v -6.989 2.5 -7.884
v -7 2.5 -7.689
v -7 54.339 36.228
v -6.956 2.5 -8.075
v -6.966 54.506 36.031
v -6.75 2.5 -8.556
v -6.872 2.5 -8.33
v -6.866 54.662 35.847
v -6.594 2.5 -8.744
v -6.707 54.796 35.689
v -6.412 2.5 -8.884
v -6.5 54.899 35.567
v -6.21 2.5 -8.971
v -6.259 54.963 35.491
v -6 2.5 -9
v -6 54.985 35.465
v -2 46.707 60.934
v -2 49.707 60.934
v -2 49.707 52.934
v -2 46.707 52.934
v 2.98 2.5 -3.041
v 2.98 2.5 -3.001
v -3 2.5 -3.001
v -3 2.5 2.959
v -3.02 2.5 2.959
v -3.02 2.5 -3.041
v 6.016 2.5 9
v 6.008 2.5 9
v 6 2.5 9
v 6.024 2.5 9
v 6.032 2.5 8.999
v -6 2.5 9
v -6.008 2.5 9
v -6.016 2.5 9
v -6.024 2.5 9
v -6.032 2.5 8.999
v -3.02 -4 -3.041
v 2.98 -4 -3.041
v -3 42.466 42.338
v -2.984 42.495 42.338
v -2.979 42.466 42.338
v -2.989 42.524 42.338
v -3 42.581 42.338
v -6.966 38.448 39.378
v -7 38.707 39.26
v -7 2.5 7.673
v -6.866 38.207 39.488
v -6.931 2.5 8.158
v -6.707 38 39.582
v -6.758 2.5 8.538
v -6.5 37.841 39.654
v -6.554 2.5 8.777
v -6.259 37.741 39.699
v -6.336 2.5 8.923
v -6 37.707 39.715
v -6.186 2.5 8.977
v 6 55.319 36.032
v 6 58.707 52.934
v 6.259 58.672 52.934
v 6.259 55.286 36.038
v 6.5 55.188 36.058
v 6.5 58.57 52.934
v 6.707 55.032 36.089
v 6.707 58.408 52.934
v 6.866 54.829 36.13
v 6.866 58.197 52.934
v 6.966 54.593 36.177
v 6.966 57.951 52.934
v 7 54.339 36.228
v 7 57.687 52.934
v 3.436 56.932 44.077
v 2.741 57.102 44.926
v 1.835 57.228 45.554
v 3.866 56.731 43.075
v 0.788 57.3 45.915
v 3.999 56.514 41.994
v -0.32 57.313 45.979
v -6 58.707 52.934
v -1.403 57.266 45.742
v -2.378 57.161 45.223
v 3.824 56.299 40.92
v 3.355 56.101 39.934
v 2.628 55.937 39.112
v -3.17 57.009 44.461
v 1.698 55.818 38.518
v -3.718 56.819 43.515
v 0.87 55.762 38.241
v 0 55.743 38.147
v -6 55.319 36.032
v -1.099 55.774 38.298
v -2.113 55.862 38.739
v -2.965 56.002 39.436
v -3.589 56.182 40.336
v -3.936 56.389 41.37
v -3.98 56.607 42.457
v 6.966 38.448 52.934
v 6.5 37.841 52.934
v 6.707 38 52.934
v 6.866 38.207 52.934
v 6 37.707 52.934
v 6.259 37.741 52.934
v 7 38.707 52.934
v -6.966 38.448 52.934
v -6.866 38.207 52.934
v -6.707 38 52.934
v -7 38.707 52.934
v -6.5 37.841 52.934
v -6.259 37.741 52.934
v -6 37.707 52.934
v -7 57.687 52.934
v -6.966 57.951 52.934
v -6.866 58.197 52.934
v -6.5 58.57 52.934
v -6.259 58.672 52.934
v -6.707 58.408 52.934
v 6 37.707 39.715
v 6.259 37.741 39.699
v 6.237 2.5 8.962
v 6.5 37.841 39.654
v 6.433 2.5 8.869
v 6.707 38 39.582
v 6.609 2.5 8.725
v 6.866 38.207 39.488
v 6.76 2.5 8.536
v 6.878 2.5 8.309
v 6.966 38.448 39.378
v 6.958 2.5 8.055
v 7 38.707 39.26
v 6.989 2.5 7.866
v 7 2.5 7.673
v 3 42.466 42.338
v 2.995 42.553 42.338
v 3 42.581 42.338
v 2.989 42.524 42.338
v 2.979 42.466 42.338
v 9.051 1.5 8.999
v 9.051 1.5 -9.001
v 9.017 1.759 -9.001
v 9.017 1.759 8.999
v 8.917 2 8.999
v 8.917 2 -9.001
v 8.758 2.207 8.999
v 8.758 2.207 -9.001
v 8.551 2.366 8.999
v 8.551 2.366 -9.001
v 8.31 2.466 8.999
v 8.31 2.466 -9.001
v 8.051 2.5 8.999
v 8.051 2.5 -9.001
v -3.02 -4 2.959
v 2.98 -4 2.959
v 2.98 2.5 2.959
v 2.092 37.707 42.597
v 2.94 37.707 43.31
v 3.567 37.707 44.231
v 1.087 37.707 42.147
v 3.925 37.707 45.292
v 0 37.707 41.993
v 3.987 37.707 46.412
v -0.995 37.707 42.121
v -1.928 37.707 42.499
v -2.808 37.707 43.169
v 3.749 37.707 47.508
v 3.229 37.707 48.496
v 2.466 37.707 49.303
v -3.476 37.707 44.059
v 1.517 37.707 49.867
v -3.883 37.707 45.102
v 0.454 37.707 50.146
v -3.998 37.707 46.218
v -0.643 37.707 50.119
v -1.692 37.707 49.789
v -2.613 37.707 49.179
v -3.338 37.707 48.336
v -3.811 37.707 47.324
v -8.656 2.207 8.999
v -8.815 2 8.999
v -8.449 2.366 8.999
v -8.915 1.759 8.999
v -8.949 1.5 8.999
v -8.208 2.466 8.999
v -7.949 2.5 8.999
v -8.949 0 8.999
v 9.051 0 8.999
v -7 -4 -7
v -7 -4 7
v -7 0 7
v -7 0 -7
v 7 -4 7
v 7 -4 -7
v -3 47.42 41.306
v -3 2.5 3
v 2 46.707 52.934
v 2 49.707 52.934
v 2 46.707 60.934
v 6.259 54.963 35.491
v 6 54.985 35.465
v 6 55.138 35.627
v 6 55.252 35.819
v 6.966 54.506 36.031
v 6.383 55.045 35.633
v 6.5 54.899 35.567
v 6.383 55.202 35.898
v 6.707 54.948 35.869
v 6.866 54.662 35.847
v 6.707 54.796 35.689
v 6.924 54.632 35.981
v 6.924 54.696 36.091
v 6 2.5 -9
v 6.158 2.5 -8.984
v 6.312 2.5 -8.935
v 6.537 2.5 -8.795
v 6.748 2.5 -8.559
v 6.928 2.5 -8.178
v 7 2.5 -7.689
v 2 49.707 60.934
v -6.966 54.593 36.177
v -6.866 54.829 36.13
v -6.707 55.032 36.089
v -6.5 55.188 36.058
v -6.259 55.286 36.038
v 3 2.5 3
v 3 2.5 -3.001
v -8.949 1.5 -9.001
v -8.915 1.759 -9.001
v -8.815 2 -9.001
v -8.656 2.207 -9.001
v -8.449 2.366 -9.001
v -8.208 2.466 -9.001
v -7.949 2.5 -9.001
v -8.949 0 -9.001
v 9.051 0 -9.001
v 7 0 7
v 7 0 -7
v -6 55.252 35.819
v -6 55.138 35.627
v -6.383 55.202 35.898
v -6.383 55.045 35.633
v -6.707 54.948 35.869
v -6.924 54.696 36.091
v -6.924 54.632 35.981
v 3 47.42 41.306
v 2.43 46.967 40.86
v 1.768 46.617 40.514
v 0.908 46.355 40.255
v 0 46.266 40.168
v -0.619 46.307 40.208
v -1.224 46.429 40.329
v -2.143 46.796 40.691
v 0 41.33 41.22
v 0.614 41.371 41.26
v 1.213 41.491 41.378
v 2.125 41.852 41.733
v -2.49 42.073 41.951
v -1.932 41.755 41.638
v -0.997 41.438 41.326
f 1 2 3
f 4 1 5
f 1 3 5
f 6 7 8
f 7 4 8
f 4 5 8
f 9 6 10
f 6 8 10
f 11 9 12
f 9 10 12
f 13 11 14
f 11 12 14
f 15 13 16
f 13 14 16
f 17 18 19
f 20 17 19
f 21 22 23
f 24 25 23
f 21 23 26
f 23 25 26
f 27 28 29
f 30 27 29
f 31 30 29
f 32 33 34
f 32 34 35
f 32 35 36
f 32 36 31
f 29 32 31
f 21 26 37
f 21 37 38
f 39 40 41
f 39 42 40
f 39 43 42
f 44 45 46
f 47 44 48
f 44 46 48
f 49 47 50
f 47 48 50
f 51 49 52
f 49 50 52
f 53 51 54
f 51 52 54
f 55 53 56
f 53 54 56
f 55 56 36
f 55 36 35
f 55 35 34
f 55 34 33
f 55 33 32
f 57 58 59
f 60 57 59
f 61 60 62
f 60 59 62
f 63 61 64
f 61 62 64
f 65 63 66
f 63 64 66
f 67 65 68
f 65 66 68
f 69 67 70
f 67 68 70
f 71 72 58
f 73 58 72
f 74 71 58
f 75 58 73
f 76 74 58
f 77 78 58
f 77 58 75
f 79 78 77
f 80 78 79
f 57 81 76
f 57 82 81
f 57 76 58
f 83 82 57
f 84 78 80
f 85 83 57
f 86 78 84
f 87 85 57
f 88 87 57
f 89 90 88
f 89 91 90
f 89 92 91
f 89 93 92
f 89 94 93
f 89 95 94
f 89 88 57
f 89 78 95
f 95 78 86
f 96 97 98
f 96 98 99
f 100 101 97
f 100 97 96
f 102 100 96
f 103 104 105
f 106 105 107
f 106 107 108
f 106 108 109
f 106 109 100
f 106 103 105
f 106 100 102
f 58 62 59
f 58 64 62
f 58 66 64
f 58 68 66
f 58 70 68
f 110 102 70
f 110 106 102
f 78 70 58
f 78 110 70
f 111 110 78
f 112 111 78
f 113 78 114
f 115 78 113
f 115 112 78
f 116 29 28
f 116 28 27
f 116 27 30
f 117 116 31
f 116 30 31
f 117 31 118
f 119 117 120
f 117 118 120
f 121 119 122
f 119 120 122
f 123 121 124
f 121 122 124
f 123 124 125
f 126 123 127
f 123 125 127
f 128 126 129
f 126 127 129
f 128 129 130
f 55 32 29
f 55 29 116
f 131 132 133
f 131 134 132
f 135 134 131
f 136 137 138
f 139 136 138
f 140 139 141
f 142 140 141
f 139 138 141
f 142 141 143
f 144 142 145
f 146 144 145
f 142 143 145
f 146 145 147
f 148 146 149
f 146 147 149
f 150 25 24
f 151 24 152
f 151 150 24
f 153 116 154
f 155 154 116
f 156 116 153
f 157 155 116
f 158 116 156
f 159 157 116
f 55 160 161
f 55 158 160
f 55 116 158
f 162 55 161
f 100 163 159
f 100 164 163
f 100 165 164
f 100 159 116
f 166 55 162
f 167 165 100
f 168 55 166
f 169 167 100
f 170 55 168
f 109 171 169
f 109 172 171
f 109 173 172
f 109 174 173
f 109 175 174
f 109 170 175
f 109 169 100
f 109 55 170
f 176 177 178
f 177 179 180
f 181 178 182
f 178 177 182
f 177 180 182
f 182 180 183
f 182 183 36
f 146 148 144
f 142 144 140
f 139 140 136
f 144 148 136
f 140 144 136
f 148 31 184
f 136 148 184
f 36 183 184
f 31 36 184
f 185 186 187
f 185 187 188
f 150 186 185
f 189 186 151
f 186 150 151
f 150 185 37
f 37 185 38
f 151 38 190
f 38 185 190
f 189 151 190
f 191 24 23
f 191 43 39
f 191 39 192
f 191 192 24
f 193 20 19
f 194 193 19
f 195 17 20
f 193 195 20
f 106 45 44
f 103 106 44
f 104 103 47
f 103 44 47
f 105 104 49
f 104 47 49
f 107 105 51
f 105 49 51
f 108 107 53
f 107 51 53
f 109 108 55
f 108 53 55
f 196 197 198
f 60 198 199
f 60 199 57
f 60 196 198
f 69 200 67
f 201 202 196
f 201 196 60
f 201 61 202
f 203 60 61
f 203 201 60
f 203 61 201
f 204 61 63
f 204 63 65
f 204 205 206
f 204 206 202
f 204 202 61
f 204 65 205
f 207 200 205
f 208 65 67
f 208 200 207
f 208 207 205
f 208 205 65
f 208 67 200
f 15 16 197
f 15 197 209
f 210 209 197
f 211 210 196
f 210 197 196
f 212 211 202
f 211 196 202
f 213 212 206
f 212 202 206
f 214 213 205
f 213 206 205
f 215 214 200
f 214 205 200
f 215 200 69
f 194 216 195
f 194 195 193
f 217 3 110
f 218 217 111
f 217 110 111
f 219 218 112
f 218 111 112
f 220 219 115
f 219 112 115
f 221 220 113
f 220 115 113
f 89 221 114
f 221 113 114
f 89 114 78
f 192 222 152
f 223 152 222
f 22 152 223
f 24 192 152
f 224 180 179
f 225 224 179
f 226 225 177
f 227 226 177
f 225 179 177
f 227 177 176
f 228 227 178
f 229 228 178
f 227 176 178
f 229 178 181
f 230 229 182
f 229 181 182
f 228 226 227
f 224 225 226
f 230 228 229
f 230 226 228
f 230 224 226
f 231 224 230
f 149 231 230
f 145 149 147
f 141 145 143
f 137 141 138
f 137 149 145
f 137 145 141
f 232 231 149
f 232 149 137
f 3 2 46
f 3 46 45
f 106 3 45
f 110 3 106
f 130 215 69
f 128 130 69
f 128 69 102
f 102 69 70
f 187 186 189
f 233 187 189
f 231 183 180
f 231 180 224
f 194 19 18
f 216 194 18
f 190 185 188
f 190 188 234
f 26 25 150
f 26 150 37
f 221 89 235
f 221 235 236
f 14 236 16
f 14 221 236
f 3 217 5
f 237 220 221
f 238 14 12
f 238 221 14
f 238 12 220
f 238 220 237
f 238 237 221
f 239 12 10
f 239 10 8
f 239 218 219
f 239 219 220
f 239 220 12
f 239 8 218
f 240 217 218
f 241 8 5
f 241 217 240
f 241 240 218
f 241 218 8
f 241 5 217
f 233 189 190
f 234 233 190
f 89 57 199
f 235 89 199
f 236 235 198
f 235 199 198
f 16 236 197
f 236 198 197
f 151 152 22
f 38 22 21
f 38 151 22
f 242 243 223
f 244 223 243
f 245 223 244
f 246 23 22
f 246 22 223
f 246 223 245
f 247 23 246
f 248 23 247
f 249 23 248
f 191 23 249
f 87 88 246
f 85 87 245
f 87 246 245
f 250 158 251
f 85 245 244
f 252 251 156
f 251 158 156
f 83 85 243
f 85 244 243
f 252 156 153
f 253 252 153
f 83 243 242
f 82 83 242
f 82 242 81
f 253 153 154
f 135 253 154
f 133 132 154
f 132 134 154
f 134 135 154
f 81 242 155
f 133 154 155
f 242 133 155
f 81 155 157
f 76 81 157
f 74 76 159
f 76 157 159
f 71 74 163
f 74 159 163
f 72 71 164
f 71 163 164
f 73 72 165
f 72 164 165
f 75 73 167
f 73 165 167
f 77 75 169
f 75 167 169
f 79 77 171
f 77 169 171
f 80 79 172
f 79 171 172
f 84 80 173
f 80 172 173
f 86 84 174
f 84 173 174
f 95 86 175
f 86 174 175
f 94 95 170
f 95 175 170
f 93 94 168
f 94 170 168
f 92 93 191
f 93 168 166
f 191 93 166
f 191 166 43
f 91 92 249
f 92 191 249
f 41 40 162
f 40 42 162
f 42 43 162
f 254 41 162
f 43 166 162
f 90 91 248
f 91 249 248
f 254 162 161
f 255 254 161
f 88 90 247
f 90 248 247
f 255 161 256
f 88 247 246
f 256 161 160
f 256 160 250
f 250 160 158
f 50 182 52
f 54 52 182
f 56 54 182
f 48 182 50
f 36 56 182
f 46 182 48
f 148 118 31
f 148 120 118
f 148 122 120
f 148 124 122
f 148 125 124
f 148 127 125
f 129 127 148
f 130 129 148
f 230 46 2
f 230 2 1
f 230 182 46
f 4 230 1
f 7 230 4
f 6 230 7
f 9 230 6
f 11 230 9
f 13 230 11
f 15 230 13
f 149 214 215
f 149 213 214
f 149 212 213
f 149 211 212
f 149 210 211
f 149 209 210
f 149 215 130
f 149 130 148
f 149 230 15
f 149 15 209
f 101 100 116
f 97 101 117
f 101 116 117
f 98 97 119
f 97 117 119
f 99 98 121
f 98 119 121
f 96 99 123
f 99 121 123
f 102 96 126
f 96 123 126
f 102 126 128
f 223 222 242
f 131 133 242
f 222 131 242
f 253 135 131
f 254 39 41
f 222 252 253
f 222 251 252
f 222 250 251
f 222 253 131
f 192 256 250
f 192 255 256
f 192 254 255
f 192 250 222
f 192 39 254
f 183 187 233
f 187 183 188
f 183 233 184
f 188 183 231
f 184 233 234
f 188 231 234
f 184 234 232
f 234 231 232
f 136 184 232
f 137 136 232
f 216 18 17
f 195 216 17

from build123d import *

# Parameters (mm, degrees)
BOSS_EXTRUDE1_DEPTH      = 2.5
BOSS_EXTRUDE1_DEPTH_BACK = 4
SKETCH2_W                = 14
SKETCH2_H                = 14
SKETCH11_W               = 18
SKETCH11_H               = 18
BOSS_EXTRUDE4_DEPTH      = 2.5
CUT_EXTRUDE5_DEPTH       = 4
CUT_EXTRUDE5_DEPTH_BACK  = 4
SKETCH3_W                = 6
SKETCH3_H                = 6
BOSS_EXTRUDE5_DEPTH      = 7
BOSS_EXTRUDE5_DEPTH_BACK = 7
CUT_EXTRUDE8_DEPTH       = 3
CUT_EXTRUDE8_DEPTH_BACK  = 3
CUT_SWEEP4_PROFILE_R     = 4
FILLET1_R                = 1
BOSS_EXTRUDE6_DEPTH      = 2
BOSS_EXTRUDE6_DEPTH_BACK = 2


with BuildPart() as part:
    # Sketch2 → Boss-Extrude1 (new, two sides: drawn at the far end of the back side and taken through both)
    with BuildSketch(Plane(origin=(0, 0, 0), x_dir=(1, 0, 0), z_dir=(0, 1, 0)).offset(-BOSS_EXTRUDE1_DEPTH_BACK)):
        Rectangle(SKETCH2_W, SKETCH2_H)
    extrude(amount=BOSS_EXTRUDE1_DEPTH + BOSS_EXTRUDE1_DEPTH_BACK)

    # Sketch11 → Boss-Extrude4 (add)
    with BuildSketch(Plane(origin=(0, 0, 0), x_dir=(1, 0, 0), z_dir=(0, 1, 0))):
        with Locations((0.051179488, 0.000677961)):
            Rectangle(SKETCH11_W, SKETCH11_H)
    extrude(amount=BOSS_EXTRUDE4_DEPTH)

    # Sketch3 → Cut-Extrude5 (cut, two sides: drawn at the far end of the back side and taken through both)
    with BuildSketch(Plane(origin=(0, 0, 0), x_dir=(1, 0, 0), z_dir=(0, 1, 0)).offset(-CUT_EXTRUDE5_DEPTH_BACK)):
        with Locations((-0.020040697, 0.041186537)):
            Rectangle(SKETCH3_W, SKETCH3_H)
    extrude(amount=CUT_EXTRUDE5_DEPTH + CUT_EXTRUDE5_DEPTH_BACK, mode=Mode.SUBTRACT)

    # Sketch13 → Boss-Extrude5 (add, two sides: drawn at the far end of the back side and taken through both)
    with BuildSketch(Plane(origin=(0, 0, 0), x_dir=(0, 0, -1), z_dir=(1, 0, 0)).offset(-BOSS_EXTRUDE5_DEPTH_BACK)):
        Polygon((-39.714937447, 37.706782945), (-52.933941772, 37.706782945), (-52.933941772, 58.706782945), (-35.69014798, 55.251043253), (9, 2.5), (0, 2.5), (-9, 2.5), align=None)
    extrude(amount=BOSS_EXTRUDE5_DEPTH + BOSS_EXTRUDE5_DEPTH_BACK)

    # Sketch16 → Cut-Extrude8 (cut, two sides: drawn at the far end of the back side and taken through both)
    with BuildSketch(Plane(origin=(0, 0, 0), x_dir=(0, 0, -1), z_dir=(1, 0, 0)).offset(-CUT_EXTRUDE8_DEPTH_BACK)):
        Polygon((0.000338981, 2.5), (3.001438968, 2.5), (-42.337880938, 48.465874453), (-42.337880938, 42.465874453), (-2.999661019, 2.5), align=None)
    extrude(amount=CUT_EXTRUDE8_DEPTH + CUT_EXTRUDE8_DEPTH_BACK, mode=Mode.SUBTRACT)

    # Cut-Sweep4: sweep along a path in Sketch52
    with BuildLine(Plane(origin=(0, 0, 0), x_dir=(0, 0, -1), z_dir=(1, 0, 0))) as cut_sweep4_path:
        Line((-41.038463706, 61.362601787), (-48.816572109, 24.884604602))
    # Cut-Sweep4 profile (on start of the path) → Cut-Sweep4 (sweep, cut)
    with BuildSketch(Plane(origin=(0, 61.362601787, 41.038463706), x_dir=(0, -0.20853937389083857, -0.9780139720562366), z_dir=(0, -0.9780139720562366, 0.20853937389083857))):
        Circle(CUT_SWEEP4_PROFILE_R)
    sweep(path=cut_sweep4_path.line, mode=Mode.SUBTRACT)

    # Fillet1
    # the kernel refuses this fillet: 1 mm, written as the material it takes off along each edge
    with BuildSketch(Plane(origin=(6, 54.338960672, 36.228063112), x_dir=(0, 0.6464027717083677, -0.7629963674407237), z_dir=(1, 0, 0))) as fillet1_piece_1_section:
        Polygon((0, 0), (FILLET1_R * 1.02, 0), (FILLET1_R * 1.02, FILLET1_R * 0.355169980491), (FILLET1_R * 0.799402336859, FILLET1_R * 0.633526561262), align=None)
    fillet1_piece_1 = extrude(amount=FILLET1_R * 1.02, mode=Mode.PRIVATE)
    fillet1_piece_1 = fillet1_piece_1 - Plane(origin=(6, 54.338960672, 36.228063112), x_dir=(0, -0.8613575242057089, 0.5079992278480466), z_dir=(1, 0, 0)) * Sphere(FILLET1_R, mode=Mode.PRIVATE)
    add(fillet1_piece_1, mode=Mode.SUBTRACT)
    with BuildSketch(Plane(origin=(-6, 54.338960672, 36.228063112), x_dir=(0, 0.9805042658587001, -0.1964977980357328), z_dir=(-1, 0, 0))) as fillet1_piece_2_section:
        Polygon((0, 0), (FILLET1_R * 1.02, 0), (FILLET1_R * 1.02, FILLET1_R * 0.355169980491), (FILLET1_R * 0.799402336859, FILLET1_R * 0.633526561262), align=None)
    fillet1_piece_2 = extrude(amount=FILLET1_R * 1.02, mode=Mode.PRIVATE)
    fillet1_piece_2 = fillet1_piece_2 - Plane(origin=(-6, 54.338960672, 36.228063112), x_dir=(0, -0.8613575242057089, 0.5079992278480466), z_dir=(-1, 0, 0)) * Sphere(FILLET1_R, mode=Mode.PRIVATE)
    add(fillet1_piece_2, mode=Mode.SUBTRACT)
    with BuildSketch(Plane(origin=(-8.948820512, 2.5, 8.999322039), x_dir=(1, 0, 0), z_dir=(0, 0, -1)), Plane(origin=(9.051179488, 2.5, -9.000677961), x_dir=(-1, 0, 0), z_dir=(0, 0, 1))) as fillet1_piece_3:
        with BuildLine():
            CenterArc((FILLET1_R, FILLET1_R), FILLET1_R, 180, 90)
            Line((0, FILLET1_R), (-FILLET1_R * 0.02, FILLET1_R))
            Line((-FILLET1_R * 0.02, FILLET1_R), (-FILLET1_R * 0.02, -FILLET1_R * 0.02))
            Line((-FILLET1_R * 0.02, -FILLET1_R * 0.02), (FILLET1_R, -FILLET1_R * 0.02))
            Line((FILLET1_R, -FILLET1_R * 0.02), (FILLET1_R, 0))
        make_face()
    extrude(amount=18, mode=Mode.SUBTRACT)
    with BuildSketch(Plane(origin=(7, 0.616147268, 7.356497982), x_dir=(0, 0.6574008072827306, -0.7535410928303872), z_dir=(0, 0.7535410928303872, 0.6574008072827306))) as fillet1_piece_4_section:
        with BuildLine():
            CenterArc((FILLET1_R, FILLET1_R), FILLET1_R, 180, 90)
            Line((0, FILLET1_R), (-FILLET1_R * 0.02, FILLET1_R))
            Line((-FILLET1_R * 0.02, FILLET1_R), (-FILLET1_R * 0.02, -FILLET1_R * 0.02))
            Line((-FILLET1_R * 0.02, -FILLET1_R * 0.02), (FILLET1_R, -FILLET1_R * 0.02))
            Line((FILLET1_R, -FILLET1_R * 0.02), (FILLET1_R, 0))
        make_face()
    fillet1_piece_4 = extrude(amount=51.721782368, mode=Mode.PRIVATE)
    fillet1_piece_4 = split(fillet1_piece_4, bisect_by=Plane(origin=(6.773604886, 2.5, 24.057027094), z_dir=(0, 1, 0)), keep=Keep.TOP, mode=Mode.PRIVATE)
    fillet1_piece_4 = split(fillet1_piece_4, bisect_by=Plane(origin=(6.773604886, 37.706782945, 24.057027094), z_dir=(0, -1, 0)), keep=Keep.TOP, mode=Mode.PRIVATE)
    add(fillet1_piece_4, mode=Mode.SUBTRACT)
    with BuildSketch(Plane(origin=(7, 37.706782945, 37.214937447), x_dir=(0, 1, 0), z_dir=(0, 0, 1))) as fillet1_piece_5_section:
        with BuildLine():
            CenterArc((FILLET1_R, FILLET1_R), FILLET1_R, 180, 90)
            Line((0, FILLET1_R), (-FILLET1_R * 0.02, FILLET1_R))
            Line((-FILLET1_R * 0.02, FILLET1_R), (-FILLET1_R * 0.02, -FILLET1_R * 0.02))
            Line((-FILLET1_R * 0.02, -FILLET1_R * 0.02), (FILLET1_R, -FILLET1_R * 0.02))
            Line((FILLET1_R, -FILLET1_R * 0.02), (FILLET1_R, 0))
        make_face()
    fillet1_piece_5 = extrude(amount=15.719004325, mode=Mode.PRIVATE)
    fillet1_piece_5 = split(fillet1_piece_5, bisect_by=Plane(origin=(6.771765338, 41.156021247, 42.724105847), z_dir=(0, -0.6574008072827306, 0.7535410928303872)), keep=Keep.TOP, mode=Mode.PRIVATE)
    add(fillet1_piece_5, mode=Mode.SUBTRACT)
    with BuildSketch(Plane(origin=(7, 59.19802744, 55.385202437), x_dir=(0, -0.9805042658587001, 0.1964977980357328), z_dir=(0, -0.1964977980357328, -0.9805042658587001))) as fillet1_piece_6_section:
        with BuildLine():
            CenterArc((FILLET1_R, FILLET1_R), FILLET1_R, 180, 90)
            Line((0, FILLET1_R), (-FILLET1_R * 0.02, FILLET1_R))
            Line((-FILLET1_R * 0.02, FILLET1_R), (-FILLET1_R * 0.02, -FILLET1_R * 0.02))
            Line((-FILLET1_R * 0.02, -FILLET1_R * 0.02), (FILLET1_R, -FILLET1_R * 0.02))
            Line((FILLET1_R, -FILLET1_R * 0.02), (FILLET1_R, 0))
        make_face()
    fillet1_piece_6 = extrude(amount=19.738452749, mode=Mode.PRIVATE)
    fillet1_piece_6 = split(fillet1_piece_6, bisect_by=Plane(origin=(6.773284847, 56.78722679, 52.933941772), z_dir=(0, 0, -1)), keep=Keep.TOP, mode=Mode.PRIVATE)
    add(fillet1_piece_6, mode=Mode.SUBTRACT)
    with BuildSketch(Plane(origin=(6, 55.251043253, 35.69014798), x_dir=(0, -0.762996367440723, -0.6464027717083685), z_dir=(-1, 0, 0))) as fillet1_piece_7:
        with BuildLine():
            CenterArc((FILLET1_R * 0.348205863226, FILLET1_R), FILLET1_R, 231.603166209, 38.396833791)
            Line((-FILLET1_R * 0.272898608599, FILLET1_R * 0.216272218766), (-FILLET1_R * 0.285320698036, FILLET1_R * 0.200597663141))
            Line((-FILLET1_R * 0.285320698036, FILLET1_R * 0.200597663141), (-FILLET1_R * 0.00696411726452, -FILLET1_R * 0.02))
            Line((-FILLET1_R * 0.00696411726452, -FILLET1_R * 0.02), (FILLET1_R * 0.348205863226, -FILLET1_R * 0.02))
            Line((FILLET1_R * 0.348205863226, -FILLET1_R * 0.02), (FILLET1_R * 0.348205863226, 0))
        make_face()
    extrude(amount=12, mode=Mode.SUBTRACT)
    with BuildSketch(Plane(origin=(7, 54.985363444, 35.465066745), x_dir=(0, -0.6464027717083677, 0.7629963674407237), z_dir=(0, -0.7629963674407237, -0.6464027717083677))) as fillet1_piece_8_section:
        with BuildLine():
            CenterArc((FILLET1_R, FILLET1_R), FILLET1_R, 180, 90)
            Line((0, FILLET1_R), (-FILLET1_R * 0.02, FILLET1_R))
            Line((-FILLET1_R * 0.02, FILLET1_R), (-FILLET1_R * 0.02, -FILLET1_R * 0.02))
            Line((-FILLET1_R * 0.02, -FILLET1_R * 0.02), (FILLET1_R, -FILLET1_R * 0.02))
            Line((FILLET1_R, -FILLET1_R * 0.02), (FILLET1_R, 0))
        make_face()
    fillet1_piece_8 = extrude(amount=71.28848404, mode=Mode.PRIVATE)
    fillet1_piece_8 = split(fillet1_piece_8, bisect_by=Plane(origin=(6.773265787, 2.5, 13.466666803), z_dir=(0, 1, 0)), keep=Keep.TOP, mode=Mode.PRIVATE)
    add(fillet1_piece_8, mode=Mode.SUBTRACT)
    with BuildSketch(Plane(origin=(-7, 0.616147268, 7.356497982), x_dir=(0, 0.6574008072827306, -0.7535410928303872), z_dir=(0, 0.7535410928303872, 0.6574008072827306))) as fillet1_piece_9_section:
        with BuildLine():
            CenterArc((FILLET1_R, -FILLET1_R), FILLET1_R, 90, 90)
            Line((0, -FILLET1_R), (-FILLET1_R * 0.02, -FILLET1_R))
            Line((-FILLET1_R * 0.02, -FILLET1_R), (-FILLET1_R * 0.02, FILLET1_R * 0.02))
            Line((-FILLET1_R * 0.02, FILLET1_R * 0.02), (FILLET1_R, FILLET1_R * 0.02))
            Line((FILLET1_R, FILLET1_R * 0.02), (FILLET1_R, 0))
        make_face()
    fillet1_piece_9 = extrude(amount=51.721782368, mode=Mode.PRIVATE)
    fillet1_piece_9 = split(fillet1_piece_9, bisect_by=Plane(origin=(-6.773604886, 2.5, 24.057027094), z_dir=(0, 1, 0)), keep=Keep.TOP, mode=Mode.PRIVATE)
    fillet1_piece_9 = split(fillet1_piece_9, bisect_by=Plane(origin=(-6.773604886, 37.706782945, 24.057027094), z_dir=(0, -1, 0)), keep=Keep.TOP, mode=Mode.PRIVATE)
    add(fillet1_piece_9, mode=Mode.SUBTRACT)
    with BuildSketch(Plane(origin=(-7, 37.706782945, 37.214937447), x_dir=(0, 1, 0), z_dir=(0, 0, 1))) as fillet1_piece_10_section:
        with BuildLine():
            CenterArc((FILLET1_R, -FILLET1_R), FILLET1_R, 90, 90)
            Line((0, -FILLET1_R), (-FILLET1_R * 0.02, -FILLET1_R))
            Line((-FILLET1_R * 0.02, -FILLET1_R), (-FILLET1_R * 0.02, FILLET1_R * 0.02))
            Line((-FILLET1_R * 0.02, FILLET1_R * 0.02), (FILLET1_R, FILLET1_R * 0.02))
            Line((FILLET1_R, FILLET1_R * 0.02), (FILLET1_R, 0))
        make_face()
    fillet1_piece_10 = extrude(amount=15.719004325, mode=Mode.PRIVATE)
    fillet1_piece_10 = split(fillet1_piece_10, bisect_by=Plane(origin=(-6.771765338, 41.156021247, 42.724105847), z_dir=(0, -0.6574008072827306, 0.7535410928303872)), keep=Keep.TOP, mode=Mode.PRIVATE)
    add(fillet1_piece_10, mode=Mode.SUBTRACT)
    with BuildSketch(Plane(origin=(-7, 59.19802744, 55.385202437), x_dir=(0, -0.9805042658587001, 0.1964977980357328), z_dir=(0, -0.1964977980357328, -0.9805042658587001))) as fillet1_piece_11_section:
        with BuildLine():
            CenterArc((FILLET1_R, -FILLET1_R), FILLET1_R, 90, 90)
            Line((0, -FILLET1_R), (-FILLET1_R * 0.02, -FILLET1_R))
            Line((-FILLET1_R * 0.02, -FILLET1_R), (-FILLET1_R * 0.02, FILLET1_R * 0.02))
            Line((-FILLET1_R * 0.02, FILLET1_R * 0.02), (FILLET1_R, FILLET1_R * 0.02))
            Line((FILLET1_R, FILLET1_R * 0.02), (FILLET1_R, 0))
        make_face()
    fillet1_piece_11 = extrude(amount=19.738452749, mode=Mode.PRIVATE)
    fillet1_piece_11 = split(fillet1_piece_11, bisect_by=Plane(origin=(-6.773284847, 56.78722679, 52.933941772), z_dir=(0, 0, -1)), keep=Keep.TOP, mode=Mode.PRIVATE)
    add(fillet1_piece_11, mode=Mode.SUBTRACT)
    with BuildSketch(Plane(origin=(-7, 54.985363444, 35.465066745), x_dir=(1, 0, 0), z_dir=(0, -0.7629963674407237, -0.6464027717083677))) as fillet1_piece_12_section:
        with BuildLine():
            CenterArc((FILLET1_R, FILLET1_R), FILLET1_R, 180, 90)
            Line((0, FILLET1_R), (-FILLET1_R * 0.02, FILLET1_R))
            Line((-FILLET1_R * 0.02, FILLET1_R), (-FILLET1_R * 0.02, -FILLET1_R * 0.02))
            Line((-FILLET1_R * 0.02, -FILLET1_R * 0.02), (FILLET1_R, -FILLET1_R * 0.02))
            Line((FILLET1_R, -FILLET1_R * 0.02), (FILLET1_R, 0))
        make_face()
    fillet1_piece_12 = extrude(amount=71.28848404, mode=Mode.PRIVATE)
    fillet1_piece_12 = split(fillet1_piece_12, bisect_by=Plane(origin=(-6.773265787, 2.5, 13.466666803), z_dir=(0, 1, 0)), keep=Keep.TOP, mode=Mode.PRIVATE)
    add(fillet1_piece_12, mode=Mode.SUBTRACT)
    with BuildSketch(Plane(origin=(7, 37.706782945, 37.214937447), x_dir=(0, 1, 0), z_dir=(0, 0, 1))) as fillet1_piece_13a_section:
        with BuildLine():
            CenterArc((FILLET1_R, FILLET1_R), FILLET1_R, 180, 90)
            Line((0, FILLET1_R), (-FILLET1_R * 0.02, FILLET1_R))
            Line((-FILLET1_R * 0.02, FILLET1_R), (-FILLET1_R * 0.02, -FILLET1_R * 0.02))
            Line((-FILLET1_R * 0.02, -FILLET1_R * 0.02), (FILLET1_R, -FILLET1_R * 0.02))
            Line((FILLET1_R, -FILLET1_R * 0.02), (FILLET1_R, 0))
        make_face()
    fillet1_piece_13a = extrude(amount=15.719004325, mode=Mode.PRIVATE)
    fillet1_piece_13a = split(fillet1_piece_13a, bisect_by=Plane(origin=(6.782484797, 37.27681683, 39.339828413), z_dir=(0, 0.6574008072827306, -0.7535410928303872)), keep=Keep.TOP, mode=Mode.PRIVATE)
    with BuildSketch(Plane(origin=(7, 0.616147268, 7.356497982), x_dir=(0, 0.6574008072827306, -0.7535410928303872), z_dir=(0, 0.7535410928303872, 0.6574008072827306))) as fillet1_piece_13b_section:
        with BuildLine():
            CenterArc((FILLET1_R, FILLET1_R), FILLET1_R, 180, 90)
            Line((0, FILLET1_R), (-FILLET1_R * 0.02, FILLET1_R))
            Line((-FILLET1_R * 0.02, FILLET1_R), (-FILLET1_R * 0.02, -FILLET1_R * 0.02))
            Line((-FILLET1_R * 0.02, -FILLET1_R * 0.02), (FILLET1_R, -FILLET1_R * 0.02))
            Line((FILLET1_R, -FILLET1_R * 0.02), (FILLET1_R, 0))
        make_face()
    fillet1_piece_13b = extrude(amount=51.721782368, mode=Mode.PRIVATE)
    fillet1_piece_13b = split(fillet1_piece_13b, bisect_by=Plane(origin=(6.782484797, 37.706782945, 40.285531565), z_dir=(0, 1, 0)), keep=Keep.TOP, mode=Mode.PRIVATE)
    fillet1_piece_13 = fillet1_piece_13a & fillet1_piece_13b
    add(fillet1_piece_13, mode=Mode.SUBTRACT)
    with BuildSketch(Plane(origin=(-7, 37.706782945, 37.214937447), x_dir=(0, 1, 0), z_dir=(0, 0, 1))) as fillet1_piece_14a_section:
        with BuildLine():
            CenterArc((FILLET1_R, -FILLET1_R), FILLET1_R, 90, 90)
            Line((0, -FILLET1_R), (-FILLET1_R * 0.02, -FILLET1_R))
            Line((-FILLET1_R * 0.02, -FILLET1_R), (-FILLET1_R * 0.02, FILLET1_R * 0.02))
            Line((-FILLET1_R * 0.02, FILLET1_R * 0.02), (FILLET1_R, FILLET1_R * 0.02))
            Line((FILLET1_R, FILLET1_R * 0.02), (FILLET1_R, 0))
        make_face()
    fillet1_piece_14a = extrude(amount=15.719004325, mode=Mode.PRIVATE)
    fillet1_piece_14a = split(fillet1_piece_14a, bisect_by=Plane(origin=(-6.782484797, 37.27681683, 39.339828413), z_dir=(0, 0.6574008072827306, -0.7535410928303872)), keep=Keep.TOP, mode=Mode.PRIVATE)
    with BuildSketch(Plane(origin=(-7, 0.616147268, 7.356497982), x_dir=(0, 0.6574008072827306, -0.7535410928303872), z_dir=(0, 0.7535410928303872, 0.6574008072827306))) as fillet1_piece_14b_section:
        with BuildLine():
            CenterArc((FILLET1_R, -FILLET1_R), FILLET1_R, 90, 90)
            Line((0, -FILLET1_R), (-FILLET1_R * 0.02, -FILLET1_R))
            Line((-FILLET1_R * 0.02, -FILLET1_R), (-FILLET1_R * 0.02, FILLET1_R * 0.02))
            Line((-FILLET1_R * 0.02, FILLET1_R * 0.02), (FILLET1_R, FILLET1_R * 0.02))
            Line((FILLET1_R, FILLET1_R * 0.02), (FILLET1_R, 0))
        make_face()
    fillet1_piece_14b = extrude(amount=51.721782368, mode=Mode.PRIVATE)
    fillet1_piece_14b = split(fillet1_piece_14b, bisect_by=Plane(origin=(-6.782484797, 37.706782945, 40.285531565), z_dir=(0, 1, 0)), keep=Keep.TOP, mode=Mode.PRIVATE)
    fillet1_piece_14 = fillet1_piece_14a & fillet1_piece_14b
    add(fillet1_piece_14, mode=Mode.SUBTRACT)


with BuildPart() as body_2:
    # Sketch59 → Boss-Extrude6 (new, two sides: drawn at the far end of the back side and taken through both)
    with BuildSketch(Plane(origin=(0, 0, 0), x_dir=(0, 0, -1), z_dir=(1, 0, 0)).offset(-BOSS_EXTRUDE6_DEPTH_BACK)):
        Polygon((-52.933941772, 48.206782945), (-52.933941772, 49.706782945), (-60.933941772, 49.706782945), (-60.933941772, 46.706782945), (-52.933941772, 46.706782945), align=None)
    extrude(amount=BOSS_EXTRUDE6_DEPTH + BOSS_EXTRUDE6_DEPTH_BACK)


solid = Compound([part.part, body_2.part])
